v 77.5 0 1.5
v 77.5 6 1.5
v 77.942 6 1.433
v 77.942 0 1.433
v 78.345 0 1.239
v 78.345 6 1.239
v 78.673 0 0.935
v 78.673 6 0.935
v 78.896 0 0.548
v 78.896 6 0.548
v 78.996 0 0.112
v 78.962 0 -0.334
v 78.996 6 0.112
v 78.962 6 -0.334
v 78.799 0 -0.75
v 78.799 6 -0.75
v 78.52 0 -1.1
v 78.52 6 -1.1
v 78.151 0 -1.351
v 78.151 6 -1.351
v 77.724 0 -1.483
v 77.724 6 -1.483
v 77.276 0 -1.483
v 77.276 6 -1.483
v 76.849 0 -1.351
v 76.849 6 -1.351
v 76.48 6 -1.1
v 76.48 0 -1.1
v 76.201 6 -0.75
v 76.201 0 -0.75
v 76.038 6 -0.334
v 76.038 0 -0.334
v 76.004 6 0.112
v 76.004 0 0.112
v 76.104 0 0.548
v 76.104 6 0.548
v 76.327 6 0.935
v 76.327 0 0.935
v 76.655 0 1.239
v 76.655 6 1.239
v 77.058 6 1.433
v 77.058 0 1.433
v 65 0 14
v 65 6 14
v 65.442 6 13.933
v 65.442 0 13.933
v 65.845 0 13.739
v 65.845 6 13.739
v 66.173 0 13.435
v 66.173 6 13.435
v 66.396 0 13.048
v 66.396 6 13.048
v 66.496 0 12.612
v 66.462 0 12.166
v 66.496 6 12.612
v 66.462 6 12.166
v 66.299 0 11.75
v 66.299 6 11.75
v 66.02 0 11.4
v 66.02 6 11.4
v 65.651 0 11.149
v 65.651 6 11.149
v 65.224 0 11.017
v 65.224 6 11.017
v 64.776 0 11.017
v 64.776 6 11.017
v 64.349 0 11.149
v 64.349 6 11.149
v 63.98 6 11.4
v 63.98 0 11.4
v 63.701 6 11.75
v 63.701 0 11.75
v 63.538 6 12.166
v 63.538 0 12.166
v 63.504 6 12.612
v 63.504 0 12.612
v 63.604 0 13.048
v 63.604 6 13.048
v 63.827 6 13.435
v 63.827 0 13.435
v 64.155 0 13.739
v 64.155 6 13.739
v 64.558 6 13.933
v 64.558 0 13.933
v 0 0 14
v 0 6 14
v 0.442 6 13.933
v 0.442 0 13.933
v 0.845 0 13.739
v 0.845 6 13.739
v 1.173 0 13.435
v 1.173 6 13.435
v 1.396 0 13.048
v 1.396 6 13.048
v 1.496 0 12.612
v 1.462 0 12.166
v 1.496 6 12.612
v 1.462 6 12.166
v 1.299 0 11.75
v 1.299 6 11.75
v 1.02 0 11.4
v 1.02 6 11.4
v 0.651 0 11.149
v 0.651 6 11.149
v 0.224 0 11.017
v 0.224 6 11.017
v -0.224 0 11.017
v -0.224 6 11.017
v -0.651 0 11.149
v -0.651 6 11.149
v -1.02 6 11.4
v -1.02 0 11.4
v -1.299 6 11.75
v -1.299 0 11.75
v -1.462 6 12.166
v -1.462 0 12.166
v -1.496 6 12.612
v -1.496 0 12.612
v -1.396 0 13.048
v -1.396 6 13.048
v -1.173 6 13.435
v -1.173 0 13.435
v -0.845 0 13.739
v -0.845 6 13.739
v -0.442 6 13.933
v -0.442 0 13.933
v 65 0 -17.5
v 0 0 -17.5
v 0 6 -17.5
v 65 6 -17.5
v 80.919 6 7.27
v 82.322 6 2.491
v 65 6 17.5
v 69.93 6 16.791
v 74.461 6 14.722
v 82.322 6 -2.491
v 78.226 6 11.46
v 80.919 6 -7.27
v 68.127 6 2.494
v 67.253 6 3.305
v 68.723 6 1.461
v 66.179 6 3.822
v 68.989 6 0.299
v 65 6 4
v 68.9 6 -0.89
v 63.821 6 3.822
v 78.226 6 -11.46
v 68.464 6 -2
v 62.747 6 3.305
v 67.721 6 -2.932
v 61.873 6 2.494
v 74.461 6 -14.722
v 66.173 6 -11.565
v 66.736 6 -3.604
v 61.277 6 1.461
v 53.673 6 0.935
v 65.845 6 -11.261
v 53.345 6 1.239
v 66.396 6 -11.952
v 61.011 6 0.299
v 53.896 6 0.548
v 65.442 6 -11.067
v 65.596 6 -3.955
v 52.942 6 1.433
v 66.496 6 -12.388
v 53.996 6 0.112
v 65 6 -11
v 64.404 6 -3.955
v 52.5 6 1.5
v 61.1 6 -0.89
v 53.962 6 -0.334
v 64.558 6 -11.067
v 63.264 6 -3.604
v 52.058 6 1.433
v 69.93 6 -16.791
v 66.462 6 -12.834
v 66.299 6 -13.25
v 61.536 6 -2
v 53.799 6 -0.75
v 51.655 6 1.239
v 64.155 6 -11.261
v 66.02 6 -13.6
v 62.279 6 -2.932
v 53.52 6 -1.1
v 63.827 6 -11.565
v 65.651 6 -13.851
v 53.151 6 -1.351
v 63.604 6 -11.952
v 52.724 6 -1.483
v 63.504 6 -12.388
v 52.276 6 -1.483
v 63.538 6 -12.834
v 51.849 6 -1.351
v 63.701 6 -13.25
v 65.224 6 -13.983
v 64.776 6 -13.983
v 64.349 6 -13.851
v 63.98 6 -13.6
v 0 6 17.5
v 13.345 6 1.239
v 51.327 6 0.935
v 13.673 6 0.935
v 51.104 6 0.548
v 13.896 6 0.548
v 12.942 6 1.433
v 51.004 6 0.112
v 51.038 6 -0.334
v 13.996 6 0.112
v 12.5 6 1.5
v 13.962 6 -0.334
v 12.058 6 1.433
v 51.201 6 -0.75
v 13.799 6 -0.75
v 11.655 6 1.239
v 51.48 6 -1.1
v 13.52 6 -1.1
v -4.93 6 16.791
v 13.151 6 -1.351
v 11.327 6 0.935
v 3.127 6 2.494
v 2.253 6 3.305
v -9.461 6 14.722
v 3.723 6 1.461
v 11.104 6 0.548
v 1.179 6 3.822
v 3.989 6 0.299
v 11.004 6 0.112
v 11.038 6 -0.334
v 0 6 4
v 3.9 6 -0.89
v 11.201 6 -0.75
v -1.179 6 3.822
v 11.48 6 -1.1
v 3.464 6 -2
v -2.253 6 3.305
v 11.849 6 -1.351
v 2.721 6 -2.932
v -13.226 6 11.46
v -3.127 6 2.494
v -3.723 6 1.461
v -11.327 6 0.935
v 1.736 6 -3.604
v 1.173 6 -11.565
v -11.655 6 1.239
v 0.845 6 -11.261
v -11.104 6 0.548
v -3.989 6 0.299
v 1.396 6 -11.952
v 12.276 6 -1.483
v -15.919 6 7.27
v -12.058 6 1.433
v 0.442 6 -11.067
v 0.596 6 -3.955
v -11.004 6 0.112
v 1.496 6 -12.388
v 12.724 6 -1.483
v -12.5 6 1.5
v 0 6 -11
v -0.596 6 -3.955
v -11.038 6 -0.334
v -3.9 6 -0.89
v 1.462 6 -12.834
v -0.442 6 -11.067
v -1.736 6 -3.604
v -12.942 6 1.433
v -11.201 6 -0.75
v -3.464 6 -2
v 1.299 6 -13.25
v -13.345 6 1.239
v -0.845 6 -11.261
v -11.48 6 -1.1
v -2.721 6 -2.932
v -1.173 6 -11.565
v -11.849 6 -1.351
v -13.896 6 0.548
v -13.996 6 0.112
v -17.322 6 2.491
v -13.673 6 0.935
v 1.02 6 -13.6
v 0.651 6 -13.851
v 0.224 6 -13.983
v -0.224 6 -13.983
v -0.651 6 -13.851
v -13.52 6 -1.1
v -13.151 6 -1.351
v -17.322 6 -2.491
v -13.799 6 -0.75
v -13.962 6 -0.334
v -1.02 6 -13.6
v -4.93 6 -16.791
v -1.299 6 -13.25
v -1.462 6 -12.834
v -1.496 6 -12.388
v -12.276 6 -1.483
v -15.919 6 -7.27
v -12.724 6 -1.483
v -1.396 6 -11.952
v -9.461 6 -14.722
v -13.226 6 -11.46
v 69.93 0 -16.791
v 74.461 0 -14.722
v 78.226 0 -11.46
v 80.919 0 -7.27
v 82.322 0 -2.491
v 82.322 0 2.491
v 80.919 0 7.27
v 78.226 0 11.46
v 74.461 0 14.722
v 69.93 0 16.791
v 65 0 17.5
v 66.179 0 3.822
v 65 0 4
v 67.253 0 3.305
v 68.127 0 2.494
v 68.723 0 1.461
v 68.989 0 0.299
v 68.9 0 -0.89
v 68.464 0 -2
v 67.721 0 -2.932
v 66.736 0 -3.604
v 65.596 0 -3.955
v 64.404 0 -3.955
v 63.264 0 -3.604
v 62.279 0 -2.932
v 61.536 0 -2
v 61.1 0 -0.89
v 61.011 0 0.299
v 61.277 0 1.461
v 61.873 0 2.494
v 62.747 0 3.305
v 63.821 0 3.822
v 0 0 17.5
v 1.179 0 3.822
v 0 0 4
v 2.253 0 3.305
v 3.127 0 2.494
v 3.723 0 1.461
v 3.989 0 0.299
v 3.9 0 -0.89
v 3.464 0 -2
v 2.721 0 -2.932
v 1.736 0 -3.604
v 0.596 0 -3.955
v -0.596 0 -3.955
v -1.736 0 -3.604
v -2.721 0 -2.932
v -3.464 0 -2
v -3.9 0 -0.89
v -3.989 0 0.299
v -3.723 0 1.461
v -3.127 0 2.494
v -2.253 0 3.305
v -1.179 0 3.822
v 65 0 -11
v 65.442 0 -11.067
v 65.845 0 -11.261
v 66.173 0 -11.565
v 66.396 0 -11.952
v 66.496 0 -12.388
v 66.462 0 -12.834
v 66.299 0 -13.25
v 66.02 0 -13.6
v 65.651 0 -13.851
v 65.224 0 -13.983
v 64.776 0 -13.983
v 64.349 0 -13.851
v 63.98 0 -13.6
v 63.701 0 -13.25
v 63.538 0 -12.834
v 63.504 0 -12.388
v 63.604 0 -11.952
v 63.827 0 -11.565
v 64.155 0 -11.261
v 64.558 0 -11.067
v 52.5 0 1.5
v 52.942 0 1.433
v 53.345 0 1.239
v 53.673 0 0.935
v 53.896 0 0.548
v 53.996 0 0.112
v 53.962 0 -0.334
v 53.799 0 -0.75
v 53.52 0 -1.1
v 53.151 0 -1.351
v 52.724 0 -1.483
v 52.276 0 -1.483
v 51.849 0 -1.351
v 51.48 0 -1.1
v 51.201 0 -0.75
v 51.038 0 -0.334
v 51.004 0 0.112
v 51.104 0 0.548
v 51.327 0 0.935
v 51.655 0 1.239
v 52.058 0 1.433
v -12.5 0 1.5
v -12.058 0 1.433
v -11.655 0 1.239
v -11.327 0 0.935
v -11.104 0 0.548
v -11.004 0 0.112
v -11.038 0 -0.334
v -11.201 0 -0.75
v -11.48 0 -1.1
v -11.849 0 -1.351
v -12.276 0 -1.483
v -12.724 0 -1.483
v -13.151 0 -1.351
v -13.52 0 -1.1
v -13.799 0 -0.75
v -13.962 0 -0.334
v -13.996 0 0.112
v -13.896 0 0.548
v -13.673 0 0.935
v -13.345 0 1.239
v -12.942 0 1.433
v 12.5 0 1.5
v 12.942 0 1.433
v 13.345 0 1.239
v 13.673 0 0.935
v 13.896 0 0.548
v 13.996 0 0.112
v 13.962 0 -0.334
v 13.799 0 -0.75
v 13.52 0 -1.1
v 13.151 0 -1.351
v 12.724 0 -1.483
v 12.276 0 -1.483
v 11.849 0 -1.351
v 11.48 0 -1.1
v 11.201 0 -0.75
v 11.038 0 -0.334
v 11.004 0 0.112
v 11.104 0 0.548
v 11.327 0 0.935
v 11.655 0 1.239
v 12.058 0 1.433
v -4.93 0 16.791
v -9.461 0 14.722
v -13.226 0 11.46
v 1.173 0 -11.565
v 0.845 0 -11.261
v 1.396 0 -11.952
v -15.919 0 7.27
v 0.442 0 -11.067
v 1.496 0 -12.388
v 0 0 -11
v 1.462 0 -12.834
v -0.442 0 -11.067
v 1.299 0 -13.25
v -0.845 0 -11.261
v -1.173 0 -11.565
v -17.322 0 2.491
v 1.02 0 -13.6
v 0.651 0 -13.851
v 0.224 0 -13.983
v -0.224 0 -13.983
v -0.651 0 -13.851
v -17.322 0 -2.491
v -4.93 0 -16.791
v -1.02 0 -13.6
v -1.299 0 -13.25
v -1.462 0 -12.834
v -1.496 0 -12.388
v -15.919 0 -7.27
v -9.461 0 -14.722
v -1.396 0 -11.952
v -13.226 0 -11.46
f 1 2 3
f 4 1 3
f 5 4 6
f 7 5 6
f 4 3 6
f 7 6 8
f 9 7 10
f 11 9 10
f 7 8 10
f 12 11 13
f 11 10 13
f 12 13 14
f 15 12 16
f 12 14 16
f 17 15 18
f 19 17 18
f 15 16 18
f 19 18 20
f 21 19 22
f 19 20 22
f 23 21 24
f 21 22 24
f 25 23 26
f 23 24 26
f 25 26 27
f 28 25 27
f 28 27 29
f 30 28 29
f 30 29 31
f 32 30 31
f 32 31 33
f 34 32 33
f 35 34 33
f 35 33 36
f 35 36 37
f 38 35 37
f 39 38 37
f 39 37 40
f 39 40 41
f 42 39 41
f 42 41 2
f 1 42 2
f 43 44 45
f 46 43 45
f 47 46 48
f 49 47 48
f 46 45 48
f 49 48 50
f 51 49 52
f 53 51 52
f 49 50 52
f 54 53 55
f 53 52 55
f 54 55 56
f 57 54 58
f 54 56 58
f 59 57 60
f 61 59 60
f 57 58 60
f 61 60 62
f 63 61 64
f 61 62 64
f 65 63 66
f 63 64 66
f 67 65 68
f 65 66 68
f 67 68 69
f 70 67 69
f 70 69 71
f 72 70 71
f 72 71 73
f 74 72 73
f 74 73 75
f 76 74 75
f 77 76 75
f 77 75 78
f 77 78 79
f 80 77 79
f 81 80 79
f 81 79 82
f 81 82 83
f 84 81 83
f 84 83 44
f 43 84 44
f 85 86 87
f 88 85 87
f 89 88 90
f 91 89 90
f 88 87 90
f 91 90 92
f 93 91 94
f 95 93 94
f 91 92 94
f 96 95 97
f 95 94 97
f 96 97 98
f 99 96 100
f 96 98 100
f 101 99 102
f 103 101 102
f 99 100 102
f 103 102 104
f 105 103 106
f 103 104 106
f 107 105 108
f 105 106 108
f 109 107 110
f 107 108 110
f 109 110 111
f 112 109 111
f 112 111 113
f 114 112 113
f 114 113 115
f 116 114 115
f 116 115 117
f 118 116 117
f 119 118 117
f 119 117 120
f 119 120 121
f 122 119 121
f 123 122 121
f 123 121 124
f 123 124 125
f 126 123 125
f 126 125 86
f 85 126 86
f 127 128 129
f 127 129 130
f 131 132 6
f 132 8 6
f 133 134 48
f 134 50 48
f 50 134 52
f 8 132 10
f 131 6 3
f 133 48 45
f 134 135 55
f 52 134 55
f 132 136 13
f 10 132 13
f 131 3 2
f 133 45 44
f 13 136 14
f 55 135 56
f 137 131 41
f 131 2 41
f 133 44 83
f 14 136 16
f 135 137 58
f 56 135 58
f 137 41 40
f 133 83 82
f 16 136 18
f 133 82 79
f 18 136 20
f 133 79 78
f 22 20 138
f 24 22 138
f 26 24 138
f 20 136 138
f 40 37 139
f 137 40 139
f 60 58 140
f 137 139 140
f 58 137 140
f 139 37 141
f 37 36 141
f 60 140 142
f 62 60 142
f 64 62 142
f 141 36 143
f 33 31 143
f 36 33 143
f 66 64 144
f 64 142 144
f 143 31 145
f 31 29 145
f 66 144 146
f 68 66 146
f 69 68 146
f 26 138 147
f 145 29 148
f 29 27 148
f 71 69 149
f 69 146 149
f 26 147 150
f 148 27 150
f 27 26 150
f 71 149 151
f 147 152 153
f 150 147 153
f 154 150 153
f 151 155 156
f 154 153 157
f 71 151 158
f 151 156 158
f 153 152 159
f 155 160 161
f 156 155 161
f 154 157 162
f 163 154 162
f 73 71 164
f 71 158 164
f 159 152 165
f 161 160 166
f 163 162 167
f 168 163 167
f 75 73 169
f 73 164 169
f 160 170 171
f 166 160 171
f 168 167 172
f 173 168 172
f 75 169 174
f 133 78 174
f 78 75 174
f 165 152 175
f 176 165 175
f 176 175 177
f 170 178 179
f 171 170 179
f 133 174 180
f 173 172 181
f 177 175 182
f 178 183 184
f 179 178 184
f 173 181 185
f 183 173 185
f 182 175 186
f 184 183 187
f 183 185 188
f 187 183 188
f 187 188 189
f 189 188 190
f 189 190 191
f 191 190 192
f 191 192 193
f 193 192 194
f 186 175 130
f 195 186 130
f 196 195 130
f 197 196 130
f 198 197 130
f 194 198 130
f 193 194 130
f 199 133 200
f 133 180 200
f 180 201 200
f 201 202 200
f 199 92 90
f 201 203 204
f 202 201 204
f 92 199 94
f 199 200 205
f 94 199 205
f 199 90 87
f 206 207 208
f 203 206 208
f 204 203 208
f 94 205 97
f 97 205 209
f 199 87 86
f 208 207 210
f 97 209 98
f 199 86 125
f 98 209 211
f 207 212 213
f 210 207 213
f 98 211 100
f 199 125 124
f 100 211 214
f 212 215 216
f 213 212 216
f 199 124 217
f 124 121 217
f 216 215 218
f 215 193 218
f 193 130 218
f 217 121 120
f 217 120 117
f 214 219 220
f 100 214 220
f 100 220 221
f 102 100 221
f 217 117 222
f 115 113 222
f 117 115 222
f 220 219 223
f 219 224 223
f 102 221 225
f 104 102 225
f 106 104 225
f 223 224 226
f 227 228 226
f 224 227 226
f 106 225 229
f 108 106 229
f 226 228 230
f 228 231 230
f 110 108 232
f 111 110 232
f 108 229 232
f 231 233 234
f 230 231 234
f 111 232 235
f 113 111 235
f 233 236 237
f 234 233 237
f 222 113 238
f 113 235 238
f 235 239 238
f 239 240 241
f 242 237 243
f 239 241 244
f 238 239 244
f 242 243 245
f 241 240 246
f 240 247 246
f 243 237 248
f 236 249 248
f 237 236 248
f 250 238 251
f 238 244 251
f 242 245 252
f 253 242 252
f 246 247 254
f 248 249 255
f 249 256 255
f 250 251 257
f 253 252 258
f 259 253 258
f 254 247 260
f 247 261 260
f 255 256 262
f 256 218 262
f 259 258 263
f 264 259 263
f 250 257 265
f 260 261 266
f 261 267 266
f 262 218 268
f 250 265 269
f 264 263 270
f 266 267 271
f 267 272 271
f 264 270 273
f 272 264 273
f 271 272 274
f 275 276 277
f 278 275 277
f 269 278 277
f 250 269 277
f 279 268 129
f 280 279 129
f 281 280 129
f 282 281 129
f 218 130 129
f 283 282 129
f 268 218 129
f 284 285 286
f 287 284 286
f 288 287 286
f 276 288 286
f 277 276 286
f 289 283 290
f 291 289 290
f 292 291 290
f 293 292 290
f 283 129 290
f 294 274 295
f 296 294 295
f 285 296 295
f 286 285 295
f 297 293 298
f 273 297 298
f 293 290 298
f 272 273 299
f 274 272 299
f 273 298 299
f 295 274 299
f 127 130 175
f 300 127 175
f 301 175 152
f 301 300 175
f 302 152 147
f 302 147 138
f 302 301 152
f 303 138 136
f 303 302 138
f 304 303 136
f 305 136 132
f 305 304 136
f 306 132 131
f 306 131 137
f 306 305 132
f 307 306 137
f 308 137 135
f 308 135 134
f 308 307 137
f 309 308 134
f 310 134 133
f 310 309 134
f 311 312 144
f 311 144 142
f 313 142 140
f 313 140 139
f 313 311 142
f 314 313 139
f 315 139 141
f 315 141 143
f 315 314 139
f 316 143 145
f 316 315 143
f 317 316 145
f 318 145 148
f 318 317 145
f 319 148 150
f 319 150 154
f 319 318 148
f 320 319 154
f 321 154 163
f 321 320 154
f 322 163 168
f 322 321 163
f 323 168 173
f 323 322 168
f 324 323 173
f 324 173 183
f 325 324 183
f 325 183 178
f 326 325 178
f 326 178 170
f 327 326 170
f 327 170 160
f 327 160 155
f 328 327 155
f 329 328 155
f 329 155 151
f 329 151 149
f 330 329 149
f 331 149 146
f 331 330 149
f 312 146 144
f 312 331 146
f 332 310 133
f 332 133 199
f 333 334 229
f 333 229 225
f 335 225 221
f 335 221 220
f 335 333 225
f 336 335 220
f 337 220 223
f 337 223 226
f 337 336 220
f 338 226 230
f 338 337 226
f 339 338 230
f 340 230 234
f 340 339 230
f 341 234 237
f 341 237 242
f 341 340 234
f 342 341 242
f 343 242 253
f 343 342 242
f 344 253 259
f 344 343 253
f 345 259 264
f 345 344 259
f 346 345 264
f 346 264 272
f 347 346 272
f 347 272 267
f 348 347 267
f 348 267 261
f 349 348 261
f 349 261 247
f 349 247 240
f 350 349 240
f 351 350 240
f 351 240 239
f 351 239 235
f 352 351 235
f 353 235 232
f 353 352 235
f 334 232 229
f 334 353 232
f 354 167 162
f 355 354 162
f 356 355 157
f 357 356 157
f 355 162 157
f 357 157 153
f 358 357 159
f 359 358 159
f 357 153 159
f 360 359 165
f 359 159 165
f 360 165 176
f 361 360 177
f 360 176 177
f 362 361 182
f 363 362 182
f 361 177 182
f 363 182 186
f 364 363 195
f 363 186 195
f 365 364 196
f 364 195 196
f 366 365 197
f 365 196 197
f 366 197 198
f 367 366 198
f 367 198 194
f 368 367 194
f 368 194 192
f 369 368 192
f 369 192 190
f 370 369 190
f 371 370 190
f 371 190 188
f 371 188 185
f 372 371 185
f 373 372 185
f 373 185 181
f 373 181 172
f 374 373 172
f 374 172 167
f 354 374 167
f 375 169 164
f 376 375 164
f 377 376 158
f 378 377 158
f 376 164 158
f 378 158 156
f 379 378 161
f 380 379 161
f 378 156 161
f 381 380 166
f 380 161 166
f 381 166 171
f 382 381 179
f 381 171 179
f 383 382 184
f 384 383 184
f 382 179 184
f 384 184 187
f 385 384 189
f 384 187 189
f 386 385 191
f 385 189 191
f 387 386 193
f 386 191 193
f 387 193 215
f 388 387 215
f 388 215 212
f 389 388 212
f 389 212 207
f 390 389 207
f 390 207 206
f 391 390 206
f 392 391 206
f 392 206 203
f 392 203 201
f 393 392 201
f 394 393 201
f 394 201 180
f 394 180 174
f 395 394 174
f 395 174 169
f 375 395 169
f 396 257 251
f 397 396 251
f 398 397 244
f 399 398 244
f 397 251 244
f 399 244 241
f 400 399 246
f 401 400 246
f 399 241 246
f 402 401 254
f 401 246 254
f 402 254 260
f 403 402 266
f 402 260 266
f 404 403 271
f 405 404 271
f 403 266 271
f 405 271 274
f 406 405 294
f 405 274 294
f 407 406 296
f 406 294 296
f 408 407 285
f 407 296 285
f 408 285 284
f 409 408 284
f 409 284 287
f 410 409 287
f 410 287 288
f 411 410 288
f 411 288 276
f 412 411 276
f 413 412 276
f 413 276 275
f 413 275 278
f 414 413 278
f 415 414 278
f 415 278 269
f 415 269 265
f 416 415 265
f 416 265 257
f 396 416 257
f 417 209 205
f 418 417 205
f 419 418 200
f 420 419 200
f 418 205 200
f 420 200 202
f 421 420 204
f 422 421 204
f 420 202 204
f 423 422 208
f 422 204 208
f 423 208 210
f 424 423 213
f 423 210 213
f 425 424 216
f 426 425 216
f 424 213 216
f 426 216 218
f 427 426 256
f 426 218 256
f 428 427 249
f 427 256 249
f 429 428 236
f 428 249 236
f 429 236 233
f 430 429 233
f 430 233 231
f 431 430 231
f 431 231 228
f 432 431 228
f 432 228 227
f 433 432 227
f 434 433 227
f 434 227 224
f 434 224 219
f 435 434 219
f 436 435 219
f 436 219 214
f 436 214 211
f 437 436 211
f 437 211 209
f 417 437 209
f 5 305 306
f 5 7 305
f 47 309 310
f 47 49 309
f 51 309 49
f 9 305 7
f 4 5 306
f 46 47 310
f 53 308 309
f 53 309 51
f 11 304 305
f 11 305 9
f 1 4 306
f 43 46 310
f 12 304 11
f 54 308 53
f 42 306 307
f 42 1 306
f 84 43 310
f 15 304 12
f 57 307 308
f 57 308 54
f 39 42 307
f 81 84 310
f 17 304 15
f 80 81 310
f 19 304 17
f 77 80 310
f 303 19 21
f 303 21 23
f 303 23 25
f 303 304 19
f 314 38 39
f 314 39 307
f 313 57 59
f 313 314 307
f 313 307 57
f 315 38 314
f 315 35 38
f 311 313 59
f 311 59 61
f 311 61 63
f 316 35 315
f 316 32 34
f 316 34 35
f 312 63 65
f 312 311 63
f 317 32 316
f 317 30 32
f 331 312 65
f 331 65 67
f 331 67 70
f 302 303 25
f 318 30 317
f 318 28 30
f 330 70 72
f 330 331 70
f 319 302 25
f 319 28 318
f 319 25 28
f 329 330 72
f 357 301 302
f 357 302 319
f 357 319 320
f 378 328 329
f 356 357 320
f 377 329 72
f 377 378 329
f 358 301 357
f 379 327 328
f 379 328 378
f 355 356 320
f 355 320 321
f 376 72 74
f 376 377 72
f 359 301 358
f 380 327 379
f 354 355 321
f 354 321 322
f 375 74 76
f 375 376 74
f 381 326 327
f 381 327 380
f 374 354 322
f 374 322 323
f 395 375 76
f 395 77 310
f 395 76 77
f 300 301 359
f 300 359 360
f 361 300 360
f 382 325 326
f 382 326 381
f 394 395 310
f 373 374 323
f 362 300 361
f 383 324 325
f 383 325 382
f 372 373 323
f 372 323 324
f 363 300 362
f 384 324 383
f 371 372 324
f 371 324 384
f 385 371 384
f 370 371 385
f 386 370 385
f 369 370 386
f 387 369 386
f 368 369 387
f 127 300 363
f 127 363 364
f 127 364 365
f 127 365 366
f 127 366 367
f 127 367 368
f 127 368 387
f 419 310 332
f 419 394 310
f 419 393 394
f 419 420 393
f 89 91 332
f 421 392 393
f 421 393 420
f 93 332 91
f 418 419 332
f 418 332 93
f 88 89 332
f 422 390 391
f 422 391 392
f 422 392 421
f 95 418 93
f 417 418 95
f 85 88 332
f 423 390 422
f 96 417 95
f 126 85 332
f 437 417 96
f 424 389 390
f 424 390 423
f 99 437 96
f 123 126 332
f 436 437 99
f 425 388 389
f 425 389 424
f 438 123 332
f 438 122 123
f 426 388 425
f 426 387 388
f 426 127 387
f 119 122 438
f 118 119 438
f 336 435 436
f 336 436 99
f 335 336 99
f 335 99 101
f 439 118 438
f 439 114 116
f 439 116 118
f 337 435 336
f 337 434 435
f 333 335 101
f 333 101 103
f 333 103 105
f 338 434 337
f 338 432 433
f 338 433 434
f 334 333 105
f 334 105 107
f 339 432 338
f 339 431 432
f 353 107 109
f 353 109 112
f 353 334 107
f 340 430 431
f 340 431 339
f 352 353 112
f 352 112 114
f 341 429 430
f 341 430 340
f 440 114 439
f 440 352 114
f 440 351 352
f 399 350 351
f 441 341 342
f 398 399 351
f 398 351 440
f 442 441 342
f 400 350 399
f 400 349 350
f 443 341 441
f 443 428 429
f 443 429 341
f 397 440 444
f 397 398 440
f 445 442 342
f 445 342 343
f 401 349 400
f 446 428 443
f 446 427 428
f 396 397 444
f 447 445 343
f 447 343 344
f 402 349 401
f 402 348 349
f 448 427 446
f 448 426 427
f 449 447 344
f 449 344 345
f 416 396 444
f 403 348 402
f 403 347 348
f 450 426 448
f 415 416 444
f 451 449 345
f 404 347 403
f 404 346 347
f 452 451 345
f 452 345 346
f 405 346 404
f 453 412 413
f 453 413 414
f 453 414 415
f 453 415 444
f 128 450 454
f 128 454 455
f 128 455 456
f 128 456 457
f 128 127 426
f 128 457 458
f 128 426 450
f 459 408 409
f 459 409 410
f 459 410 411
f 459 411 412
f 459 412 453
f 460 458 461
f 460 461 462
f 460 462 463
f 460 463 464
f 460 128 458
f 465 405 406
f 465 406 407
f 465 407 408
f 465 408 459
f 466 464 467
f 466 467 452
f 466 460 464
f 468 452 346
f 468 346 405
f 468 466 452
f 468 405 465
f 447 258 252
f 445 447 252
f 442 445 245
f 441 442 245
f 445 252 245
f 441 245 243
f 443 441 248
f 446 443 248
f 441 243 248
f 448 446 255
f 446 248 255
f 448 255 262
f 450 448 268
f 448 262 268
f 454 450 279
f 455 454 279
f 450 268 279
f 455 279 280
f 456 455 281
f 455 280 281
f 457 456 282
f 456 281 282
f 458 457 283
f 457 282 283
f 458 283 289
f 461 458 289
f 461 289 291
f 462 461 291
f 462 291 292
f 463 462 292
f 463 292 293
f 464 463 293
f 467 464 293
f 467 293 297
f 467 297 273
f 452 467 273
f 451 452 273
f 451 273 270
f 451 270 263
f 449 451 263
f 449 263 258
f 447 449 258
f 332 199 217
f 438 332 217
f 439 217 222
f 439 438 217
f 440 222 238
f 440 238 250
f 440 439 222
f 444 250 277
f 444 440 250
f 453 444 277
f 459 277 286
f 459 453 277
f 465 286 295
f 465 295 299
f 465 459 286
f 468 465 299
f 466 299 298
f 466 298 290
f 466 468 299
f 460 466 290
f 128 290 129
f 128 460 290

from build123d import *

# Parameters (mm, degrees)
SKETCH1_R           = 4
BOSS_EXTRUDE1_DEPTH = 6
SKETCH3_R           = 1.5
CUT_EXTRUDE1_DEPTH  = 19
SKETCH4_R           = 1.5
CUT_EXTRUDE2_DEPTH  = 19


with BuildPart() as part:
    # Sketch1 → Boss-Extrude1 (new body)
    with BuildSketch(Plane(origin=(0, 0, 0), x_dir=(1, 0, 0), z_dir=(0, 1, 0))):
        with BuildLine():
            Line((0, 17.5), (65, 17.5))
            ThreePointArc((65, 17.5), (82.5, 0), (65, -17.5))
            Line((65, -17.5), (0, -17.5))
            ThreePointArc((0, -17.5), (-17.5, 0), (0, 17.5))
        make_face()
        with Locations(Location((65, 0, 0), (0, 0, 270))):
            Circle(SKETCH1_R, mode=Mode.SUBTRACT)
        with Locations(Location((0, 0, 0), (0, 0, 270))):
            Circle(SKETCH1_R, mode=Mode.SUBTRACT)
    extrude(amount=BOSS_EXTRUDE1_DEPTH)

    # Sketch3 → Cut-Extrude1 (cut)
    with BuildSketch(Plane(origin=(0, 6, 0), x_dir=(1, 0, 0), z_dir=(0, 1, 0))):
        with Locations(Location((0, 12.5, 0), (0, 0, 270))):
            Circle(SKETCH3_R)
        with Locations(Location((12.5, 0, 0), (0, 0, 270))):
            Circle(SKETCH3_R)
        with Locations(Location((0, -12.5, 0), (0, 0, 270))):
            Circle(SKETCH3_R)
        with Locations(Location((-12.5, 0, 0), (0, 0, 270))):
            Circle(SKETCH3_R)
    extrude(amount=-CUT_EXTRUDE1_DEPTH, mode=Mode.SUBTRACT)

    # Sketch4 → Cut-Extrude2 (cut)
    with BuildSketch(Plane(origin=(0, 6, 0), x_dir=(1, 0, 0), z_dir=(0, 1, 0))):
        with Locations(Location((77.5, 0, 0), (0, 0, 270))):
            Circle(SKETCH4_R)
        with Locations(Location((65, -12.5, 0), (0, 0, 270))):
            Circle(SKETCH4_R)
        with Locations(Location((52.5, 0, 0), (0, 0, 270))):
            Circle(SKETCH4_R)
        with Locations(Location((65, 12.5, 0), (0, 0, 270))):
            Circle(SKETCH4_R)
    extrude(amount=-CUT_EXTRUDE2_DEPTH, mode=Mode.SUBTRACT)


solid = part.part
